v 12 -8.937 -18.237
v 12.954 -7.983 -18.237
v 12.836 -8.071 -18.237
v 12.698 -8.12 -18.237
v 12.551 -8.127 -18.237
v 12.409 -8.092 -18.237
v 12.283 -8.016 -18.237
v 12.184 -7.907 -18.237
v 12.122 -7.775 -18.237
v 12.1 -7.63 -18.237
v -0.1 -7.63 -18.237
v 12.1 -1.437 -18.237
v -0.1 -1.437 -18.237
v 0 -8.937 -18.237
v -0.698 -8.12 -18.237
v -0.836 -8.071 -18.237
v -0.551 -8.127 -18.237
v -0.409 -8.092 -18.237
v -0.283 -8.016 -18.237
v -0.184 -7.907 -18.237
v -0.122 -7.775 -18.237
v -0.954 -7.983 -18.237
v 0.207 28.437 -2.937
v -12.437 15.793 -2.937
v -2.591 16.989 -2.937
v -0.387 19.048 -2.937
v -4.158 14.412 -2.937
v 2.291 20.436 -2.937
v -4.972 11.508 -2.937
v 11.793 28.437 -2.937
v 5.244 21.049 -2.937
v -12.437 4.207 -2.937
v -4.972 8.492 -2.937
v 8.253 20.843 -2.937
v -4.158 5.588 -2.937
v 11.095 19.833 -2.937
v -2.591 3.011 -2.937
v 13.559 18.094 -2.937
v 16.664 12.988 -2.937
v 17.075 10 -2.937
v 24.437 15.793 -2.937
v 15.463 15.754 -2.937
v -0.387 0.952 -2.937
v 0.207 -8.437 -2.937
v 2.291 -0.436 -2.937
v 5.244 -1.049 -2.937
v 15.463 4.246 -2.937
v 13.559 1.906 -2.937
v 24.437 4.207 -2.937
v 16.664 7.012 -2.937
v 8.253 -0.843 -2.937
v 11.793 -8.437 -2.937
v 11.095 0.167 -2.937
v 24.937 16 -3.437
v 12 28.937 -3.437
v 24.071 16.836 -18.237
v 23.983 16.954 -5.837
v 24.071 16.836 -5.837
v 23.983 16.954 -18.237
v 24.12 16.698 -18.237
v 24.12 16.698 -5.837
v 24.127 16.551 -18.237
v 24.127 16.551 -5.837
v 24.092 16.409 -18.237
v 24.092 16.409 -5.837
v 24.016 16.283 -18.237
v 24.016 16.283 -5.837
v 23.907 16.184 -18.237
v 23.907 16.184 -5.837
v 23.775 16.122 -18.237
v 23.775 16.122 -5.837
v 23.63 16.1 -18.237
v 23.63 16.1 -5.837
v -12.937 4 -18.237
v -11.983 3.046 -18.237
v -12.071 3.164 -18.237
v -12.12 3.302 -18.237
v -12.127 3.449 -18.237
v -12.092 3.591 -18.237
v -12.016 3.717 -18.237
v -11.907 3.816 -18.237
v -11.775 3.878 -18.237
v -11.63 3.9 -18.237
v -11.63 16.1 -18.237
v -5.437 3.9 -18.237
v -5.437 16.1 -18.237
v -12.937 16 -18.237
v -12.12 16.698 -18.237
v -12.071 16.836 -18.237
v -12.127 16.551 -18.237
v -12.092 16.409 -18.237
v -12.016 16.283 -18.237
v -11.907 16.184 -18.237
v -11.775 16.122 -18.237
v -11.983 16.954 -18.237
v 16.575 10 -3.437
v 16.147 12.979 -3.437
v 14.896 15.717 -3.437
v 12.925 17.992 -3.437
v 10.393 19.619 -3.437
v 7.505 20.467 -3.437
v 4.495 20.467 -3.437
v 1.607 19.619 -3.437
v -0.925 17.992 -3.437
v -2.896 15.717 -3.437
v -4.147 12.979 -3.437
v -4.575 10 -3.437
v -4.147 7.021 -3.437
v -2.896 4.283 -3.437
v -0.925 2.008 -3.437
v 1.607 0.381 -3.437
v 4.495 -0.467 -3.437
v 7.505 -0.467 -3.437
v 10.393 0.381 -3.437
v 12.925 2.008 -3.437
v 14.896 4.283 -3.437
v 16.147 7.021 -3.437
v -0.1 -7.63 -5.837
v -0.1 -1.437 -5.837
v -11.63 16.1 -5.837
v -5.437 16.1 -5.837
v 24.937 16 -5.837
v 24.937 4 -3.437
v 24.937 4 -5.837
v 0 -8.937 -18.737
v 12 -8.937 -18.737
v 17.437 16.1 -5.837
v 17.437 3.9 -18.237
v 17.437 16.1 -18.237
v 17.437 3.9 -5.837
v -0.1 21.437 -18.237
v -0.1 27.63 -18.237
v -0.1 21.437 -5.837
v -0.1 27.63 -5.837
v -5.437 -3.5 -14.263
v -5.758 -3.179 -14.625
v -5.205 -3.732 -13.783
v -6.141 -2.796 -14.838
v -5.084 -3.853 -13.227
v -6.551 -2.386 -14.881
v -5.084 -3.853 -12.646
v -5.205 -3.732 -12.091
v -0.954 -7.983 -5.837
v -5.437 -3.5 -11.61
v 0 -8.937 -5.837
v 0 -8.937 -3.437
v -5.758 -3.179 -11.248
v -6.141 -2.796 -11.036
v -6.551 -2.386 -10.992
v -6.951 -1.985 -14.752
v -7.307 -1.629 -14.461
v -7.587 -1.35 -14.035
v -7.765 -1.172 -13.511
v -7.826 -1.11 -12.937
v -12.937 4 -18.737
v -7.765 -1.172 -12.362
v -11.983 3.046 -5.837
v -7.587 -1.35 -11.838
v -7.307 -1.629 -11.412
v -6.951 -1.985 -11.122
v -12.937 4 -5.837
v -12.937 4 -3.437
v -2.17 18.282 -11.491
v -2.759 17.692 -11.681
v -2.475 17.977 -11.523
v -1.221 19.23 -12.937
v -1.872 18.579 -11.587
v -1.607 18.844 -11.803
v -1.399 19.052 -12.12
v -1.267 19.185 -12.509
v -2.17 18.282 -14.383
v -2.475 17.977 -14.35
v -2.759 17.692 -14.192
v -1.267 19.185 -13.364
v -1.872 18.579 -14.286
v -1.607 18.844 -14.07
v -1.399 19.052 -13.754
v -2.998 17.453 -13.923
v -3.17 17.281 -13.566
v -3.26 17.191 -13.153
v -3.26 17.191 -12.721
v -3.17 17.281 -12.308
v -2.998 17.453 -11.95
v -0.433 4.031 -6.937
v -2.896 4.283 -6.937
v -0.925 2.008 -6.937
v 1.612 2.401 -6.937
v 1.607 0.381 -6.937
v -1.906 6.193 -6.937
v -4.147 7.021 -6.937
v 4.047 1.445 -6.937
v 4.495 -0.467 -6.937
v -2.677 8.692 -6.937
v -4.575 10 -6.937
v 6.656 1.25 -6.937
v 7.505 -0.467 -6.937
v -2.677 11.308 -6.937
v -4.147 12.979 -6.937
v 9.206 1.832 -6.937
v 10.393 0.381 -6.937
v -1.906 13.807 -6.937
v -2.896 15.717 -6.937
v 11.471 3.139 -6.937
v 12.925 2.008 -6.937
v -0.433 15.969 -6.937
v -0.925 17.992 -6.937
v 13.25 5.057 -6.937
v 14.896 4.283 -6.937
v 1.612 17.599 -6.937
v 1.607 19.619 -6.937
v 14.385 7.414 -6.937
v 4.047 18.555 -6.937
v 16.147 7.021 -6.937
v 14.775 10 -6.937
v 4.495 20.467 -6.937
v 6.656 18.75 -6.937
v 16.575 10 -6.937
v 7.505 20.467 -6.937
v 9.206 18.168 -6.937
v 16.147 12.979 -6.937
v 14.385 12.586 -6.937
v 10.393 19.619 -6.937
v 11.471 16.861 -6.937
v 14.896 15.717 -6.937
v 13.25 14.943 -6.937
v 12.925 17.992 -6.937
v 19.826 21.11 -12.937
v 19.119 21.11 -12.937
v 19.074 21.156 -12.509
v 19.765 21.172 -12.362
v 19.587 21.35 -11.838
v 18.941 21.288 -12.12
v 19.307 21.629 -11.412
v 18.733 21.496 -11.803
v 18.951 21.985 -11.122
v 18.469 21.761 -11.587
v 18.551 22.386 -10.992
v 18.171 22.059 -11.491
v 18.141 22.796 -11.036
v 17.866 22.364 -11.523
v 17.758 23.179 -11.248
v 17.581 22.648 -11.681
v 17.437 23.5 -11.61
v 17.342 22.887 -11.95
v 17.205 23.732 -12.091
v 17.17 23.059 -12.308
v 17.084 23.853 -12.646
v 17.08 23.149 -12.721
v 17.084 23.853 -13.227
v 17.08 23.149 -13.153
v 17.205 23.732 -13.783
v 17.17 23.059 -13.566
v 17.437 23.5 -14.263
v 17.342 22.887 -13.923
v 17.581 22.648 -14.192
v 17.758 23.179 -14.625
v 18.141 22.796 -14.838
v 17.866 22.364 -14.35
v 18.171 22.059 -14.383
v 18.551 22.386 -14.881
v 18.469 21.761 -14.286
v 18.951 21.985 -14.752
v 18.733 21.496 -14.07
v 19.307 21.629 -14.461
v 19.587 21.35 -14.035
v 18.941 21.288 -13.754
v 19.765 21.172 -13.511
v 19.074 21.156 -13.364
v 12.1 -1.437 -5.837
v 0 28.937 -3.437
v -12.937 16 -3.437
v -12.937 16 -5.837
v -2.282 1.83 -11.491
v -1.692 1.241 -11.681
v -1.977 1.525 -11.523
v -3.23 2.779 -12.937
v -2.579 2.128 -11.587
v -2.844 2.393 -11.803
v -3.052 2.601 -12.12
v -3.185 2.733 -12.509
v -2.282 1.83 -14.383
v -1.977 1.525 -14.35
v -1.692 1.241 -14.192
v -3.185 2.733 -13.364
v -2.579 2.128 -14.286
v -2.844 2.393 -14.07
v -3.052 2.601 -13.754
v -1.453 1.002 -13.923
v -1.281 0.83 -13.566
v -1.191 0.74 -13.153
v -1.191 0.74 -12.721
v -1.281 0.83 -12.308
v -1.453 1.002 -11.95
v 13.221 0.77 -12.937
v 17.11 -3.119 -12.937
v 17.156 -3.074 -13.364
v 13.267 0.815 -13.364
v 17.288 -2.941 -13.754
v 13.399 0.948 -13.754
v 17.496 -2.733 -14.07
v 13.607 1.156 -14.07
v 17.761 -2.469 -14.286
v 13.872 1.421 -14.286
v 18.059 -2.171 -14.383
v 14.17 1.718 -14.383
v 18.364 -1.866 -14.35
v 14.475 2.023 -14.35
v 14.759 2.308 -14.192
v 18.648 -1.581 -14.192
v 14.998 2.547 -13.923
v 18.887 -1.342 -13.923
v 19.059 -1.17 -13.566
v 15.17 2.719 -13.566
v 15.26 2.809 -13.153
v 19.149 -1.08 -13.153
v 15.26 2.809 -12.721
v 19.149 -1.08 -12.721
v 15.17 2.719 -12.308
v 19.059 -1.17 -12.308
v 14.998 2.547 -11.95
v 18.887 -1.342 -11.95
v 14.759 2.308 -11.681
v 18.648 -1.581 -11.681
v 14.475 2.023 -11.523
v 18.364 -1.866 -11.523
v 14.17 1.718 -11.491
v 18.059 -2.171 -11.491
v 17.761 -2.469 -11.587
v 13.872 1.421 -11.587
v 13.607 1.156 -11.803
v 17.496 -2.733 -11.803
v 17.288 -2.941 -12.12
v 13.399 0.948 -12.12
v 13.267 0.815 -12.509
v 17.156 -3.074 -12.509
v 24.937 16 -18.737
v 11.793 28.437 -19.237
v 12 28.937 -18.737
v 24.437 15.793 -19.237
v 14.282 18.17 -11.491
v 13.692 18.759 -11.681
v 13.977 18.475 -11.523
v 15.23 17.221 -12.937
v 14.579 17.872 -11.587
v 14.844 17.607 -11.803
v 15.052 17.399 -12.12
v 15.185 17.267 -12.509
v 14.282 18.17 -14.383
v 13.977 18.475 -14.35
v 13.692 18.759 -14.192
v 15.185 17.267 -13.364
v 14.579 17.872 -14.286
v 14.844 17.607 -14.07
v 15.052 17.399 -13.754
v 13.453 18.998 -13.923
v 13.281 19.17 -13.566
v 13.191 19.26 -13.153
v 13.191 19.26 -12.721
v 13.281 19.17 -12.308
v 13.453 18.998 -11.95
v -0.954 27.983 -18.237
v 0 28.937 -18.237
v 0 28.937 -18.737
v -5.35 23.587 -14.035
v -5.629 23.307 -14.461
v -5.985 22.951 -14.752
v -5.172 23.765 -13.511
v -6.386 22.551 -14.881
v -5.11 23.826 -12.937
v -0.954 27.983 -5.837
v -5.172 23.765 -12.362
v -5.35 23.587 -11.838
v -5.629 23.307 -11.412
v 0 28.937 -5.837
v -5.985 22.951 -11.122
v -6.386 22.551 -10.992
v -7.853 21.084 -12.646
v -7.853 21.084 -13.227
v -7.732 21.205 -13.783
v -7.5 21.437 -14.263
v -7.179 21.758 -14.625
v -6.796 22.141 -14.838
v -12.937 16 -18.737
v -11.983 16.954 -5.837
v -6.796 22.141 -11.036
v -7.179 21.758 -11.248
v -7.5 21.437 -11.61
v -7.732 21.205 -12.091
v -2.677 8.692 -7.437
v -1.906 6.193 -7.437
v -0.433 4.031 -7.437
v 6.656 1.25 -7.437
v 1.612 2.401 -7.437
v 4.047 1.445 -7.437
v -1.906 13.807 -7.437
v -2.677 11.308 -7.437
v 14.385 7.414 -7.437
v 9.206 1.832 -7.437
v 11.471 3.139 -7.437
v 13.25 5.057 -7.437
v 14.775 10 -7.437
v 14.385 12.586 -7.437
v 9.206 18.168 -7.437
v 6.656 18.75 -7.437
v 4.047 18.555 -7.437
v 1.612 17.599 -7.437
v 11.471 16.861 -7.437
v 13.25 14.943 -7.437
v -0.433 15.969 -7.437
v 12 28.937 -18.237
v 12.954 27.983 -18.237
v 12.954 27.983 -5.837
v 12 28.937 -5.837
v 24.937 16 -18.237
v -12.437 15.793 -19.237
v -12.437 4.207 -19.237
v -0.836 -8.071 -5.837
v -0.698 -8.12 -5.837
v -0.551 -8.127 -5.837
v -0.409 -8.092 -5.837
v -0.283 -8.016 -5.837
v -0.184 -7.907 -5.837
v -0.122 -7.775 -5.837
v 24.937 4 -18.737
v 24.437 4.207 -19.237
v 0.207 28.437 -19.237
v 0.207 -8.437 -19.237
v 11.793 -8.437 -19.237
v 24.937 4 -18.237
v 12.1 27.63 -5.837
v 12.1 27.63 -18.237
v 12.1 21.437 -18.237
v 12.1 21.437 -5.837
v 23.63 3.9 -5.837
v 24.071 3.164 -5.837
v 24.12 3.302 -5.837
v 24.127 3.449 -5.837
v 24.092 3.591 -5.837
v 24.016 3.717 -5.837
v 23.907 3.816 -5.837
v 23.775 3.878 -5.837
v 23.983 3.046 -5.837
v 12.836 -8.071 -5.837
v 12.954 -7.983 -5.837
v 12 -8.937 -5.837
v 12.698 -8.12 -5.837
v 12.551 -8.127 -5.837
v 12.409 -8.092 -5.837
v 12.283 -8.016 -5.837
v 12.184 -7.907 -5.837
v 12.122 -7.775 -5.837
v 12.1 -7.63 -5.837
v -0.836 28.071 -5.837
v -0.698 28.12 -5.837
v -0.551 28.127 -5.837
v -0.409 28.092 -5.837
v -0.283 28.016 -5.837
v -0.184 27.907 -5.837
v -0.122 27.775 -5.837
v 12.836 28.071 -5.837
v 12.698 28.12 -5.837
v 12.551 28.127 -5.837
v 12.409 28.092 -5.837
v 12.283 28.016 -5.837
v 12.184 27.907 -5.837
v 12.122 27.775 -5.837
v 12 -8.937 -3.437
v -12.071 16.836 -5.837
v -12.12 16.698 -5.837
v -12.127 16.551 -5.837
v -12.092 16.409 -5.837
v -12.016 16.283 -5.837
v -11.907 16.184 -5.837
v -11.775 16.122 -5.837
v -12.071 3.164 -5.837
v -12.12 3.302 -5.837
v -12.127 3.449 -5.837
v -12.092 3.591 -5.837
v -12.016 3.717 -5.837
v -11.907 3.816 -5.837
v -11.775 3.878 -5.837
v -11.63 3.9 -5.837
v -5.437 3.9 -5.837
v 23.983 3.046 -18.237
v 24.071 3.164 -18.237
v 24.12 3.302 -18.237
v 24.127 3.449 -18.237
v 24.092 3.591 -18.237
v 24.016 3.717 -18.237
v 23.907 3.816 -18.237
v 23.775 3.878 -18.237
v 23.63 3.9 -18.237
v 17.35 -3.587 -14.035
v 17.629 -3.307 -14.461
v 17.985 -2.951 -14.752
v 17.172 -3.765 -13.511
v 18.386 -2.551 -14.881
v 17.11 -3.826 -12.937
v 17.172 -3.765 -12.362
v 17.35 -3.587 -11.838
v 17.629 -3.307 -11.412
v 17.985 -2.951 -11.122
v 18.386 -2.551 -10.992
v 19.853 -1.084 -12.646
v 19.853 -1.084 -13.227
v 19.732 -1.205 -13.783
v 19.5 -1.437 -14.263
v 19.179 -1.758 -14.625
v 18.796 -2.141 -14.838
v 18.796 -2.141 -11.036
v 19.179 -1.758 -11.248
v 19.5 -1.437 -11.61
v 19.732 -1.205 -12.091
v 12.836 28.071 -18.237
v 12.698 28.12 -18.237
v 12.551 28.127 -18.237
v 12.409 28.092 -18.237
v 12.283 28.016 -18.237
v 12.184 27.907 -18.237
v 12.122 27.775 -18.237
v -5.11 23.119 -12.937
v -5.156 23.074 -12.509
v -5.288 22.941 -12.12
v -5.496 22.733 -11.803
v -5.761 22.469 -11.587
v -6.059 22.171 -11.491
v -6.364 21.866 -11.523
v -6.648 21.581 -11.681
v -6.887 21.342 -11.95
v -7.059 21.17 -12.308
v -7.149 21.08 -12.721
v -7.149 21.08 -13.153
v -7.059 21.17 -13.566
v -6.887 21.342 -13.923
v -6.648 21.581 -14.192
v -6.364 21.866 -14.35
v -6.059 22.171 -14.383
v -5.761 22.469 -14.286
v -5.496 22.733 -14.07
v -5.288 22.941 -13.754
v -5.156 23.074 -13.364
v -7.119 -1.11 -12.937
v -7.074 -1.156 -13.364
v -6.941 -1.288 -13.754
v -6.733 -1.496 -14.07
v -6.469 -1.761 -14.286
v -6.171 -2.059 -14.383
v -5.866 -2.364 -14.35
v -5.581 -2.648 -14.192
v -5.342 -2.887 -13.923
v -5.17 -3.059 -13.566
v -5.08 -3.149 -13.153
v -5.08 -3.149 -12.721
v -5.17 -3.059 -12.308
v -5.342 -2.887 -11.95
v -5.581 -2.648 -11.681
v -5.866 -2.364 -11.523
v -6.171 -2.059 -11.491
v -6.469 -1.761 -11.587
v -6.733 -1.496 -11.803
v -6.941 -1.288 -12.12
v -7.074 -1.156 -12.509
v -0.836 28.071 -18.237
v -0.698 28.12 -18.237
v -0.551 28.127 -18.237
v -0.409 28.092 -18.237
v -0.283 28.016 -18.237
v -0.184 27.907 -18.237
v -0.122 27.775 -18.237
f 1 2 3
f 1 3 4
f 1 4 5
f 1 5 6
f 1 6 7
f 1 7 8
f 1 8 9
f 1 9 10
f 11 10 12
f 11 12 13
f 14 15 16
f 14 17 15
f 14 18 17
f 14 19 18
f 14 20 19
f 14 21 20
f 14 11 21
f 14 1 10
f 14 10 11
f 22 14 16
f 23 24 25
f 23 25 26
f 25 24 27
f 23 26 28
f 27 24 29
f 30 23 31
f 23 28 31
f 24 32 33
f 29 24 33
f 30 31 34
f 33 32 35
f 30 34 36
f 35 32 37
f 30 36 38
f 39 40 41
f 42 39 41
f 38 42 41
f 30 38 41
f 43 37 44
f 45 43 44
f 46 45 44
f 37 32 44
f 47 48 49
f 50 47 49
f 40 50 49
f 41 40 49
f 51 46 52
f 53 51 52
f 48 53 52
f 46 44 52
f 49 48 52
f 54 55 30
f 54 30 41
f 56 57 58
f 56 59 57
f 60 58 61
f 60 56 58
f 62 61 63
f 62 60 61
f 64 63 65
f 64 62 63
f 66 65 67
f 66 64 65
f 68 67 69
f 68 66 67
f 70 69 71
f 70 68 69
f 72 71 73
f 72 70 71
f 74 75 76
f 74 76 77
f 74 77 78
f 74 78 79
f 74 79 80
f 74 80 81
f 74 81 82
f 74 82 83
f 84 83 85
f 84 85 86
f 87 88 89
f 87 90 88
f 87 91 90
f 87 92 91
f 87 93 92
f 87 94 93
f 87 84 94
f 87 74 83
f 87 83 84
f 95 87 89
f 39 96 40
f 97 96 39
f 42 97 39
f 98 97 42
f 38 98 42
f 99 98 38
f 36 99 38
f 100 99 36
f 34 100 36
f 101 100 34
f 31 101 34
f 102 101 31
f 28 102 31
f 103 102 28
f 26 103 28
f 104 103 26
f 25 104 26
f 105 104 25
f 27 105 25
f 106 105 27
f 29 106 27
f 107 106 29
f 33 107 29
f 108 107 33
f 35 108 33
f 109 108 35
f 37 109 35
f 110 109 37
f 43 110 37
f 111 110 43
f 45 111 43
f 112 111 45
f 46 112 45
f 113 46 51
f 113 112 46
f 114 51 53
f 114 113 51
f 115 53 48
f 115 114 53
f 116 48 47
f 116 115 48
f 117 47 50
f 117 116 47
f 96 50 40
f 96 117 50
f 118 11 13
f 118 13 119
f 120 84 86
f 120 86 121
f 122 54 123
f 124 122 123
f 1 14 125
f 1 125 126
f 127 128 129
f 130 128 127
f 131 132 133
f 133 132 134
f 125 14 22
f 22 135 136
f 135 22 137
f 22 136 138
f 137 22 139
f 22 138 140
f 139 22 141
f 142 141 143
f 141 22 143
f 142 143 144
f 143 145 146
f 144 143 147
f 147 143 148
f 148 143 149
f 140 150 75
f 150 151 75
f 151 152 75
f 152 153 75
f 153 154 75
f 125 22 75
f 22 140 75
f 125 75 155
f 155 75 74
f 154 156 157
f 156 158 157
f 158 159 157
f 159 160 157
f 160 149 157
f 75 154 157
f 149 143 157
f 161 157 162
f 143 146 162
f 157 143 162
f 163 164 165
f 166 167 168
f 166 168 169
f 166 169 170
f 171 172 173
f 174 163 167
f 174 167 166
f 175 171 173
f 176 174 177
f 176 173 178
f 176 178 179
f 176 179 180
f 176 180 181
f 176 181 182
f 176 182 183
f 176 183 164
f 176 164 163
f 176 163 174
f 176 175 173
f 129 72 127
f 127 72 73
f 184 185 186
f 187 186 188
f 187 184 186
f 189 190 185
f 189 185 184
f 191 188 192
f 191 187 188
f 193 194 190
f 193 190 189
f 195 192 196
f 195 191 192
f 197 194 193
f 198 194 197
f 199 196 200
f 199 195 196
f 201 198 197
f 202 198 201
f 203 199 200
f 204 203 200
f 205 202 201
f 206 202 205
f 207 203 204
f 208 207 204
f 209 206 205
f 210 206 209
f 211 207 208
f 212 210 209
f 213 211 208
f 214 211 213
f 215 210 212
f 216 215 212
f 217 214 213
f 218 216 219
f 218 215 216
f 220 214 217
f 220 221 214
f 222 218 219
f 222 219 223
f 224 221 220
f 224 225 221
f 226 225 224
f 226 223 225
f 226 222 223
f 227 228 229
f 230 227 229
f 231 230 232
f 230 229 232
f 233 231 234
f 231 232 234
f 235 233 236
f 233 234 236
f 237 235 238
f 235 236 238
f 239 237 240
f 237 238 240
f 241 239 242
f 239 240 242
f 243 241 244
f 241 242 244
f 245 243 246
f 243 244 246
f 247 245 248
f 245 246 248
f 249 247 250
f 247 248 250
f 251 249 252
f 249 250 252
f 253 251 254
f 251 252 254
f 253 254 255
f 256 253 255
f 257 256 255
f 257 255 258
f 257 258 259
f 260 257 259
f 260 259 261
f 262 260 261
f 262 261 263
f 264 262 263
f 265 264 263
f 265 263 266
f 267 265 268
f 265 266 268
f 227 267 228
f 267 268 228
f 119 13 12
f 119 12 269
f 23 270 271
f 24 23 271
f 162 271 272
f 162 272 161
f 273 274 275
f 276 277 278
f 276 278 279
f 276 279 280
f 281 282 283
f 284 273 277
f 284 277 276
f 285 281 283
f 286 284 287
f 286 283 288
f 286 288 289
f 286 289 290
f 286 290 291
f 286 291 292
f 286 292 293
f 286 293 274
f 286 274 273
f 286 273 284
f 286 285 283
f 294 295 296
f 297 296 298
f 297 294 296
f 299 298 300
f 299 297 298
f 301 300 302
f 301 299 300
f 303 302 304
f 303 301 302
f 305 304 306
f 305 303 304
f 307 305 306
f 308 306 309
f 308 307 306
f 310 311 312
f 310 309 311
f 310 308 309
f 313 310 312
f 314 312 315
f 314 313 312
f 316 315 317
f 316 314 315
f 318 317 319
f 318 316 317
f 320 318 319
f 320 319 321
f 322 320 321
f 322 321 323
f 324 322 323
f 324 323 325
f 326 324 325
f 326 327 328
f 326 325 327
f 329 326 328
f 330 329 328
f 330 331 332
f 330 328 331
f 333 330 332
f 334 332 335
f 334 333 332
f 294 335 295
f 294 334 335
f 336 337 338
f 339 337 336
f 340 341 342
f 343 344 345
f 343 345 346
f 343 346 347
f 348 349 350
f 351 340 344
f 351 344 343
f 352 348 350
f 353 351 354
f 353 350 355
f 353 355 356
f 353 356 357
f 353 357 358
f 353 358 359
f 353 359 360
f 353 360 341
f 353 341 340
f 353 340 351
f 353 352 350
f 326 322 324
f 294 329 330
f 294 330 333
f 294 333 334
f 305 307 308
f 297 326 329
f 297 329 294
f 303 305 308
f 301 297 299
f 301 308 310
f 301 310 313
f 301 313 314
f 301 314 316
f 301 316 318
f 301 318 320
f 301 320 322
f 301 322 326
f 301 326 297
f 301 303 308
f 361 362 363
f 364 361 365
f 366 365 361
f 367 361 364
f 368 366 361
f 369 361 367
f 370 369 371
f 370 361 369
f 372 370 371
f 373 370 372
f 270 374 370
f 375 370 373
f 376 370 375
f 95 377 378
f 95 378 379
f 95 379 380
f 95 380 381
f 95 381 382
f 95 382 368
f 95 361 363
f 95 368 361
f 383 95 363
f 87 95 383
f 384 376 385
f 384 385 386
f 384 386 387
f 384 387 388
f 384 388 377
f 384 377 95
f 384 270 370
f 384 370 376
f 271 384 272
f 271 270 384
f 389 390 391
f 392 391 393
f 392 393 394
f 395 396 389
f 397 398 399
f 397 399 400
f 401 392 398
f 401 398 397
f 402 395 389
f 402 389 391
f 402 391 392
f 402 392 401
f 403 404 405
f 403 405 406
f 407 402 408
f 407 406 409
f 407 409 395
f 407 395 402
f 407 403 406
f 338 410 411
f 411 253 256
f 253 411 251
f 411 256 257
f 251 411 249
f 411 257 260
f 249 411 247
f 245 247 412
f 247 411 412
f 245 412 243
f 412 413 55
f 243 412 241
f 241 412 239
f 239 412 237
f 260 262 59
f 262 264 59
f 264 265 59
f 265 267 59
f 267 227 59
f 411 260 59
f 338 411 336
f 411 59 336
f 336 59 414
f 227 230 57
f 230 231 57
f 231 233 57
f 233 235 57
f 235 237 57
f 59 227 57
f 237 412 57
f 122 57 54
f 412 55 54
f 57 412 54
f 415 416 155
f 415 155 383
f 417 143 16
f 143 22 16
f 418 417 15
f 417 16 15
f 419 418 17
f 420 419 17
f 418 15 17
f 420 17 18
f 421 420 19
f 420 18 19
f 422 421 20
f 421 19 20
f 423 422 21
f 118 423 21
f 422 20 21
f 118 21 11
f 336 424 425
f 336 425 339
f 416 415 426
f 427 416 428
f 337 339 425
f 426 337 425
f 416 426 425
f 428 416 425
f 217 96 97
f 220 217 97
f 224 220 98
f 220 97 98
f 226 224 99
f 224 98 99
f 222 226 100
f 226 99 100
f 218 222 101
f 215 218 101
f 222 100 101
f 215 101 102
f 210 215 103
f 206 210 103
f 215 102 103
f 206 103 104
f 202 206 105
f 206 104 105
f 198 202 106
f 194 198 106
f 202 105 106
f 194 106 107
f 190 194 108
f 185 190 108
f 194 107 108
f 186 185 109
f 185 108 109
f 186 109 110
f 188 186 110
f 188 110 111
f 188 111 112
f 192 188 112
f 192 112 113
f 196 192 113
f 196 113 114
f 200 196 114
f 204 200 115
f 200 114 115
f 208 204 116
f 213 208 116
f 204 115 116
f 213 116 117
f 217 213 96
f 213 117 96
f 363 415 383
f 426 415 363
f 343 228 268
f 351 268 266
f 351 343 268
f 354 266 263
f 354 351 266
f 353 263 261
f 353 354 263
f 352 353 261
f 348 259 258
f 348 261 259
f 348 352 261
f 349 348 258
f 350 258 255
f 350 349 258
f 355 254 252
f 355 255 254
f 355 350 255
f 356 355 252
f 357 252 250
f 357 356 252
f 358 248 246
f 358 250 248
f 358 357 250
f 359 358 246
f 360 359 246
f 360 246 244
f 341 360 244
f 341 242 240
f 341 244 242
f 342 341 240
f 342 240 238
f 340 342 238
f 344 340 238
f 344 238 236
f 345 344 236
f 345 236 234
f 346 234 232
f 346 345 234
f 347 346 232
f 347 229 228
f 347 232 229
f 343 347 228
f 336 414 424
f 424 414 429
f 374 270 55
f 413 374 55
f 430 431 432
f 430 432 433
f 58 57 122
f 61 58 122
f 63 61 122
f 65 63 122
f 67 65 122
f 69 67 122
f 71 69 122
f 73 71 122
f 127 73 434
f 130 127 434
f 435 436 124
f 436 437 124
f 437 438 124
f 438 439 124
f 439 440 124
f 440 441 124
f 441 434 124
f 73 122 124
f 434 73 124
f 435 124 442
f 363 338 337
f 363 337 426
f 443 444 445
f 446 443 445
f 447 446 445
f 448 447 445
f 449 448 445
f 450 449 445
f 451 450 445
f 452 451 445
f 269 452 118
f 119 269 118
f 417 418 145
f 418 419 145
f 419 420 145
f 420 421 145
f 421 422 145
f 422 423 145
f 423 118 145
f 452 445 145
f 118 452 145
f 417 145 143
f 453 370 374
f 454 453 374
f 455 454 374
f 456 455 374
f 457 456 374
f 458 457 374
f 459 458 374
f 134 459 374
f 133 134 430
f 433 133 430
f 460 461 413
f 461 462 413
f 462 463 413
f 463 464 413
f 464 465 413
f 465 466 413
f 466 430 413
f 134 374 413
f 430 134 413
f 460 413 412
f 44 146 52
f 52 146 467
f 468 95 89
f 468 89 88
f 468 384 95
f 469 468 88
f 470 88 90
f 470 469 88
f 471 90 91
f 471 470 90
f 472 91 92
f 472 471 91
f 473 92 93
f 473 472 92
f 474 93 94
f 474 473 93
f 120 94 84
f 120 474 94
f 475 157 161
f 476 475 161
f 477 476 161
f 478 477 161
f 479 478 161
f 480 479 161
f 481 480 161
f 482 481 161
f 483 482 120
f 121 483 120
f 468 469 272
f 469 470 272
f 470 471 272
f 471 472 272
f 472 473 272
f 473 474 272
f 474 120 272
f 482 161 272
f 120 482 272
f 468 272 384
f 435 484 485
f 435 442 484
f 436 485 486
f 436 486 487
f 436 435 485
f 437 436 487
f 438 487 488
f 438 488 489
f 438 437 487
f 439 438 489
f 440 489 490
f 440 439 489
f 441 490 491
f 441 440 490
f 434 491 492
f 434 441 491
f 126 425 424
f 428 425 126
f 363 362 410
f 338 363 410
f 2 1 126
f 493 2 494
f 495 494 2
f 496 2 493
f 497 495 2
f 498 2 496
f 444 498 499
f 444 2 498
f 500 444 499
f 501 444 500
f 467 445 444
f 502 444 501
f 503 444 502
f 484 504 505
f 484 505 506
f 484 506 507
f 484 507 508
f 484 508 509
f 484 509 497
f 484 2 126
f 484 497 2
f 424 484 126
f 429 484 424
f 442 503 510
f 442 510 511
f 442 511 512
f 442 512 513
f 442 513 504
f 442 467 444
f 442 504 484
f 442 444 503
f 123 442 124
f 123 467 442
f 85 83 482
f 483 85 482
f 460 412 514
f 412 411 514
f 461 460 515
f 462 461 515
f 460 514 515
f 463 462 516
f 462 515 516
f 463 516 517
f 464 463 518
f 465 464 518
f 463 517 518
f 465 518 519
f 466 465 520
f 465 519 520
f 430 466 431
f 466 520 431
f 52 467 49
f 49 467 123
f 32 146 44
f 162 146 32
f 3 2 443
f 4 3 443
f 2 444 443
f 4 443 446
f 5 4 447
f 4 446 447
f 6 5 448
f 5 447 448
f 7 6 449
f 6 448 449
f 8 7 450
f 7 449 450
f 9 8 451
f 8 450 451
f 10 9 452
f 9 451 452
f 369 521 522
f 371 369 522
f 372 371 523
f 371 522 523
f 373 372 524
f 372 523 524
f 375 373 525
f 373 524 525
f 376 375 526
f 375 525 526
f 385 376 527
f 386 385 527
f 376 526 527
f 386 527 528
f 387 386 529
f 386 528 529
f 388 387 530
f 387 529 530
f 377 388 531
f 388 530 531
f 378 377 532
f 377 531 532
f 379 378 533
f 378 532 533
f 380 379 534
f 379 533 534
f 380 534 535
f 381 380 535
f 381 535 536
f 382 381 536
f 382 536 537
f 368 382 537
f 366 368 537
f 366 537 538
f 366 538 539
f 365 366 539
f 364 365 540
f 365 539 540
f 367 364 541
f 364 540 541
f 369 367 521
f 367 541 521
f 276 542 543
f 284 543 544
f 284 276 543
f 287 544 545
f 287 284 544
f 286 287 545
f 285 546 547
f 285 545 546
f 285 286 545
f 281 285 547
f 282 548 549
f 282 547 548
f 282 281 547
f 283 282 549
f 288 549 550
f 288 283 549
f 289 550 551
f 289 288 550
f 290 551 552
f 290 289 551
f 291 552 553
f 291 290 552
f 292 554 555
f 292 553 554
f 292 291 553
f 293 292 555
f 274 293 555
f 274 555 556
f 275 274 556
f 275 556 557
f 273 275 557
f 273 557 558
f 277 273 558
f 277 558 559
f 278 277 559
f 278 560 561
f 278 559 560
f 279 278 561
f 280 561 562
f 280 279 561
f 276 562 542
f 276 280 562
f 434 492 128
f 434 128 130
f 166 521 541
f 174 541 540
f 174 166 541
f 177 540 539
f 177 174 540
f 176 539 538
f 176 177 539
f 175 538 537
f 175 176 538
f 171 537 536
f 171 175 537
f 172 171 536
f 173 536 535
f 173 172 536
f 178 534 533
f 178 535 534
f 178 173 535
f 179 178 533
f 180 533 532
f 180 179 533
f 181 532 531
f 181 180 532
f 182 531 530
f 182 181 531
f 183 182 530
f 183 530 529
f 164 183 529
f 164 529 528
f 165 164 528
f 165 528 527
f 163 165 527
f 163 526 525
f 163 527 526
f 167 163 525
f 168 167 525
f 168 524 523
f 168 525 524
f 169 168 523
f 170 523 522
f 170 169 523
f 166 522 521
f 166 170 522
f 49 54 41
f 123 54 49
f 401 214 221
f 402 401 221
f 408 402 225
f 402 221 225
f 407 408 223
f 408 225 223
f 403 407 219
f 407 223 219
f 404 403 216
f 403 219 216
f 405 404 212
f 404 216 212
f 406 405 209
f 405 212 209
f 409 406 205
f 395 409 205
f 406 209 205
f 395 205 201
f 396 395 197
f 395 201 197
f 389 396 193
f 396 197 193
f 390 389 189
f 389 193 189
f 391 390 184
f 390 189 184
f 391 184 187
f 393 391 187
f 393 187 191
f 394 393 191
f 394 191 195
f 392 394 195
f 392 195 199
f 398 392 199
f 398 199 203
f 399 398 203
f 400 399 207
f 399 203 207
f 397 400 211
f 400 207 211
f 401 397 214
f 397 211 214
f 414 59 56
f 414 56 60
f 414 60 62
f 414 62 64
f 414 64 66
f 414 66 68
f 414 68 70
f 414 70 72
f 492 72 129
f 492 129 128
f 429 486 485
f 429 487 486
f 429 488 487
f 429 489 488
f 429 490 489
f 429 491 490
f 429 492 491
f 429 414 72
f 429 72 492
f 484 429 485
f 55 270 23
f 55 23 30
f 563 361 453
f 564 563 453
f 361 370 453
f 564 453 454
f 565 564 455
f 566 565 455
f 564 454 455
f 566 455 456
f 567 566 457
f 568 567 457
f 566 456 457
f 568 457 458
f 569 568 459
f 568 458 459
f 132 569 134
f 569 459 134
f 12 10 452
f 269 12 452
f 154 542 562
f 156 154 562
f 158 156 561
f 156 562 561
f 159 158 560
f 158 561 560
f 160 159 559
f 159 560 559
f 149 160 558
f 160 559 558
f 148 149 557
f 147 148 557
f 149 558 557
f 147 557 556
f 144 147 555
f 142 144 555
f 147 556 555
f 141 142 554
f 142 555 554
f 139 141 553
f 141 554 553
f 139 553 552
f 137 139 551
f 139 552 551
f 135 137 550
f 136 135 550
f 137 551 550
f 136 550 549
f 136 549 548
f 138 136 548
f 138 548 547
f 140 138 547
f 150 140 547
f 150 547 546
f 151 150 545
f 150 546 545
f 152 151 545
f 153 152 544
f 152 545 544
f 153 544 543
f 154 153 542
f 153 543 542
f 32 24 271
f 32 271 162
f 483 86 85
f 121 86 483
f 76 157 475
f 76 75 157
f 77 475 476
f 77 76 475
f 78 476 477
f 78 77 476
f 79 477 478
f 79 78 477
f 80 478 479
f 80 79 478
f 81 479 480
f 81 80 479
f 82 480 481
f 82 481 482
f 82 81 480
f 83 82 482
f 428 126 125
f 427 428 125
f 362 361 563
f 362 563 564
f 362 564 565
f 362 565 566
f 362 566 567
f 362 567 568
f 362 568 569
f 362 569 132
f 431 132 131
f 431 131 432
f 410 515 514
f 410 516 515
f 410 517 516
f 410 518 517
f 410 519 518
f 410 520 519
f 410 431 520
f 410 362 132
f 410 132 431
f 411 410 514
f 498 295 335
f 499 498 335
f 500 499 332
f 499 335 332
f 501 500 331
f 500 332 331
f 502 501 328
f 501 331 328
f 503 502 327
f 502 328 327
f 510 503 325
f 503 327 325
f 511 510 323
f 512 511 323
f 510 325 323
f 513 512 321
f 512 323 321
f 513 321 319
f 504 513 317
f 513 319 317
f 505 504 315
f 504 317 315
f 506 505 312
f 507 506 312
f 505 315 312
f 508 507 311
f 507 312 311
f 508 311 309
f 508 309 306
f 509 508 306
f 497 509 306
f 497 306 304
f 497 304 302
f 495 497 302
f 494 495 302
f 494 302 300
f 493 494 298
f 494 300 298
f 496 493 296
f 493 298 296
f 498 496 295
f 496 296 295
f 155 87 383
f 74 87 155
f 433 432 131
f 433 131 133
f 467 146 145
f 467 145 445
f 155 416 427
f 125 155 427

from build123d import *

# Parameters (mm, degrees)
SKIZZE1_W                          = 37.873435046
SKIZZE1_H                          = 37.873435047
AUFSATZ_LINEAR_AUSTRAGEN1_DEPTH    = 20
SKIZZE2_R                          = 10.575
SCHNITT_LINEAR_AUSTRAGEN1_DEPTH    = 4
SKIZZE3_W                          = 12
SKIZZE3_H                          = 12
SCHNITT_LINEAR_AUSTRAGEN3_DEPTH    = 7.5
VERRUNDUNG1_R                      = 8
KREISMUSTER1_COUNT                 = 4
SKIZZE4_R                          = 8.775
SCHNITT_LINEAR_AUSTRAGEN4_DEPTH    = 0.5
K_RPER_VERSCHIEBEN_KOPIEREN1_ANGLE = 90
SCHNITT_LINEAR_AUSTRAGEN5_DEPTH    = 21
SCHNITT_LINEAR_START               = -6
SKIZZE6_R                          = 1.45
SCHNITT_LINEAR_AUSTRAGEN6_DEPTH    = 16
KREISMUSTER2_COUNT                 = 4
SKIZZE7_W                          = 35.652729611
SKIZZE7_H                          = 9.273531579
SCHNITT_LINEAR_AUSTRAGEN8_DEPTH    = 45.41348481
SKIZZE8_W                          = 12.4
SKIZZE8_H                          = 12.2
SCHNITT_LINEAR_AUSTRAGEN9_DEPTH    = 7.5
KREISMUSTER11_COUNT                = 4
FASE1_SIZE                         = 0.5
VERRUNDUNG2_R                      = 0.5


with BuildPart() as part:
    # Skizze1 → Aufsatz-Linear austragen1 (new body)
    with BuildSketch(Plane(origin=(0, 0, 0), x_dir=(1, 0, 0), z_dir=(0, 1, 0))):
        with Locations((6, 12.936717524)):
            Rectangle(SKIZZE1_W, SKIZZE1_H)
    extrude(amount=AUFSATZ_LINEAR_AUSTRAGEN1_DEPTH)

    # Skizze2 → Schnitt-Linear austragen1 (cut)
    with BuildSketch(Plane.XZ):
        with Locations((6, -12.936717523)):
            Circle(SKIZZE2_R)
    extrude(amount=-SCHNITT_LINEAR_AUSTRAGEN1_DEPTH, mode=Mode.SUBTRACT)

    # Skizze3 → Schnitt-Linear austragen3 (cut)
    with BuildSketch(Plane.XY.offset(6)):
        with Locations((6, 9.2)):
            Rectangle(SKIZZE3_W, SKIZZE3_H)
    schnitt_linear_austragen3 = extrude(amount=-SCHNITT_LINEAR_AUSTRAGEN3_DEPTH, mode=Mode.SUBTRACT)

    # Verrundung1
    verrundung1_edges = [part.edges().sort_by_distance(p)[0] for p in [
        (24.936717523, 10, -31.873435047),
        (24.936717523, 10, 6),
        (-12.936717523, 10, 6),
        (-12.936717523, 10, -31.873435047),
    ]]
    fillet(verrundung1_edges, radius=VERRUNDUNG1_R)

    # Kreismuster1: Schnitt-Linear austragen3 ×4 about axis
    kreismuster1_axis = Axis((6, 0, -12.936717523), (0, 1, 0))
    for i in range(1, KREISMUSTER1_COUNT):
        add(schnitt_linear_austragen3.rotate(kreismuster1_axis, i * 360 / KREISMUSTER1_COUNT), mode=Mode.SUBTRACT)

    # Skizze4 → Schnitt-Linear austragen4 (cut)
    with BuildSketch(Plane.XZ.offset(-4)):
        with Locations((6, -12.936717523)):
            Circle(SKIZZE4_R)
    extrude(amount=-SCHNITT_LINEAR_AUSTRAGEN4_DEPTH, mode=Mode.SUBTRACT)


with BuildPart() as part_1:
    # Körper-Verschieben/Kopieren1: moved
    add(part.part.rotate(Axis((0, 10, -12.936717523), (-1, 0, 0)), K_RPER_VERSCHIEBEN_KOPIEREN1_ANGLE))

    # Skizze5 → Schnitt-Linear austragen5 (cut, through all)
    with BuildSketch(Plane.XY.offset(-2.936717523)):
        Polygon((0, 28.936717523), (-12.936717523, 16), (-12.936717523, 28.936717523), align=None)
        Polygon((24.936717523, 16), (24.936717523, 28.936717523), (12, 28.936717523), align=None)
        Polygon((12, -8.936717523), (24.936717523, 4), (24.936717523, -8.936717523), align=None)
        Polygon((-12.936717523, -8.936717523), (0, -8.936717523), (-12.936717523, 4), align=None)
    extrude(amount=-SCHNITT_LINEAR_AUSTRAGEN5_DEPTH, mode=Mode.SUBTRACT)

    # Skizze6 → Schnitt-Linear austragen6 (cut)
    with BuildSketch(Plane(origin=(-14.468358762, 14.468358762, 0), x_dir=(0.707106781, 0.707106781, 0), z_dir=(-0.707106781, 0.707106781, 0)).offset(SCHNITT_LINEAR_START)):
        with Locations((11.284238529, 12.936717523)):
            Circle(SKIZZE6_R)
    schnitt_linear_austragen6 = extrude(amount=SCHNITT_LINEAR_AUSTRAGEN6_DEPTH, mode=Mode.SUBTRACT)

    # Kreismuster2: Schnitt-Linear austragen6 ×4 about axis
    kreismuster2_axis = Axis((6, 10, 0), (0, 0, 1))
    for i in range(1, KREISMUSTER2_COUNT):
        add(schnitt_linear_austragen6.rotate(kreismuster2_axis, i * 360 / KREISMUSTER2_COUNT), mode=Mode.SUBTRACT)

    # Skizze7 → Schnitt-Linear austragen8 (cut, through all)
    with BuildSketch(Plane(origin=(20.468358762, 20.468358762, 0), x_dir=(0.707106781, -0.707106781, 0), z_dir=(0.707106781, 0.707106781, 0))):
        with Locations((-3.021869868, 23.873483313)):
            Rectangle(SKIZZE7_W, SKIZZE7_H)
    extrude(amount=-SCHNITT_LINEAR_AUSTRAGEN8_DEPTH, mode=Mode.SUBTRACT)

    # Skizze8 → Schnitt-Linear austragen9 (cut)
    with BuildSketch(Plane.ZY.offset(12.936717523)):
        with Locations((-12.036717523, 10)):
            Rectangle(SKIZZE8_W, SKIZZE8_H)
    schnitt_linear_austragen9 = extrude(amount=-SCHNITT_LINEAR_AUSTRAGEN9_DEPTH, mode=Mode.SUBTRACT)

    # Kreismuster11: Schnitt-Linear austragen9 ×4 about axis
    kreismuster11_axis = Axis((6, 10, 0), (0, 0, 1))
    for i in range(1, KREISMUSTER11_COUNT):
        add(schnitt_linear_austragen9.rotate(kreismuster11_axis, i * 360 / KREISMUSTER11_COUNT), mode=Mode.SUBTRACT)

    # Fase1
    fase1_edges = [part_1.edges().sort_by_distance(p)[0] for p in [
        (-12.936717523, 10, -2.936717523),
        (6, -8.936717523, -2.936717523),
        (24.936717523, 10, -2.936717523),
        (6, 28.936717523, -2.936717523),
        (-6.468358762, -2.468358762, -2.936717523),
        (18.468358762, -2.468358762, -2.936717523),
        (18.468358762, 22.468358762, -2.936717523),
        (-4.575, 10, -2.936717523),
        (-6.468358762, 22.468358762, -2.936717523),
        (-7.51450201, 21.422215513, -12.936717523),
        (-5.422215513, -3.51450201, -12.936717523),
        (19.51450201, -1.422215513, -12.936717523),
        (17.422215513, 23.51450201, -12.936717523),
        (-6.468358762, 22.468358762, -19.236717523),
        (18.468358762, 22.468358762, -19.236717523),
        (18.468358762, -2.468358762, -19.236717523),
        (24.936717523, 10, -19.236717523),
        (6, 28.936717523, -19.236717523),
        (-12.936717523, 10, -19.236717523),
        (-6.468358762, -2.468358762, -19.236717523),
        (6, -8.936717523, -19.236717523),
    ]]
    chamfer(fase1_edges, length=FASE1_SIZE)

    # Verrundung2
    verrundung2_edges = [part_1.edges().sort_by_distance(p)[0] for p in [
        (-12.836717523, 16.1, -12.036717523),
        (-12.836717523, 3.9, -12.036717523),
        (-0.1, 28.836717523, -12.036717523),
        (12.1, 28.836717523, -12.036717523),
        (24.836717523, 16.1, -12.036717523),
        (-0.1, -8.836717523, -12.036717523),
        (24.836717523, 3.9, -12.036717523),
        (12.1, -8.836717523, -12.036717523),
    ]]
    fillet(verrundung2_edges, radius=VERRUNDUNG2_R)


solid = part_1.part
